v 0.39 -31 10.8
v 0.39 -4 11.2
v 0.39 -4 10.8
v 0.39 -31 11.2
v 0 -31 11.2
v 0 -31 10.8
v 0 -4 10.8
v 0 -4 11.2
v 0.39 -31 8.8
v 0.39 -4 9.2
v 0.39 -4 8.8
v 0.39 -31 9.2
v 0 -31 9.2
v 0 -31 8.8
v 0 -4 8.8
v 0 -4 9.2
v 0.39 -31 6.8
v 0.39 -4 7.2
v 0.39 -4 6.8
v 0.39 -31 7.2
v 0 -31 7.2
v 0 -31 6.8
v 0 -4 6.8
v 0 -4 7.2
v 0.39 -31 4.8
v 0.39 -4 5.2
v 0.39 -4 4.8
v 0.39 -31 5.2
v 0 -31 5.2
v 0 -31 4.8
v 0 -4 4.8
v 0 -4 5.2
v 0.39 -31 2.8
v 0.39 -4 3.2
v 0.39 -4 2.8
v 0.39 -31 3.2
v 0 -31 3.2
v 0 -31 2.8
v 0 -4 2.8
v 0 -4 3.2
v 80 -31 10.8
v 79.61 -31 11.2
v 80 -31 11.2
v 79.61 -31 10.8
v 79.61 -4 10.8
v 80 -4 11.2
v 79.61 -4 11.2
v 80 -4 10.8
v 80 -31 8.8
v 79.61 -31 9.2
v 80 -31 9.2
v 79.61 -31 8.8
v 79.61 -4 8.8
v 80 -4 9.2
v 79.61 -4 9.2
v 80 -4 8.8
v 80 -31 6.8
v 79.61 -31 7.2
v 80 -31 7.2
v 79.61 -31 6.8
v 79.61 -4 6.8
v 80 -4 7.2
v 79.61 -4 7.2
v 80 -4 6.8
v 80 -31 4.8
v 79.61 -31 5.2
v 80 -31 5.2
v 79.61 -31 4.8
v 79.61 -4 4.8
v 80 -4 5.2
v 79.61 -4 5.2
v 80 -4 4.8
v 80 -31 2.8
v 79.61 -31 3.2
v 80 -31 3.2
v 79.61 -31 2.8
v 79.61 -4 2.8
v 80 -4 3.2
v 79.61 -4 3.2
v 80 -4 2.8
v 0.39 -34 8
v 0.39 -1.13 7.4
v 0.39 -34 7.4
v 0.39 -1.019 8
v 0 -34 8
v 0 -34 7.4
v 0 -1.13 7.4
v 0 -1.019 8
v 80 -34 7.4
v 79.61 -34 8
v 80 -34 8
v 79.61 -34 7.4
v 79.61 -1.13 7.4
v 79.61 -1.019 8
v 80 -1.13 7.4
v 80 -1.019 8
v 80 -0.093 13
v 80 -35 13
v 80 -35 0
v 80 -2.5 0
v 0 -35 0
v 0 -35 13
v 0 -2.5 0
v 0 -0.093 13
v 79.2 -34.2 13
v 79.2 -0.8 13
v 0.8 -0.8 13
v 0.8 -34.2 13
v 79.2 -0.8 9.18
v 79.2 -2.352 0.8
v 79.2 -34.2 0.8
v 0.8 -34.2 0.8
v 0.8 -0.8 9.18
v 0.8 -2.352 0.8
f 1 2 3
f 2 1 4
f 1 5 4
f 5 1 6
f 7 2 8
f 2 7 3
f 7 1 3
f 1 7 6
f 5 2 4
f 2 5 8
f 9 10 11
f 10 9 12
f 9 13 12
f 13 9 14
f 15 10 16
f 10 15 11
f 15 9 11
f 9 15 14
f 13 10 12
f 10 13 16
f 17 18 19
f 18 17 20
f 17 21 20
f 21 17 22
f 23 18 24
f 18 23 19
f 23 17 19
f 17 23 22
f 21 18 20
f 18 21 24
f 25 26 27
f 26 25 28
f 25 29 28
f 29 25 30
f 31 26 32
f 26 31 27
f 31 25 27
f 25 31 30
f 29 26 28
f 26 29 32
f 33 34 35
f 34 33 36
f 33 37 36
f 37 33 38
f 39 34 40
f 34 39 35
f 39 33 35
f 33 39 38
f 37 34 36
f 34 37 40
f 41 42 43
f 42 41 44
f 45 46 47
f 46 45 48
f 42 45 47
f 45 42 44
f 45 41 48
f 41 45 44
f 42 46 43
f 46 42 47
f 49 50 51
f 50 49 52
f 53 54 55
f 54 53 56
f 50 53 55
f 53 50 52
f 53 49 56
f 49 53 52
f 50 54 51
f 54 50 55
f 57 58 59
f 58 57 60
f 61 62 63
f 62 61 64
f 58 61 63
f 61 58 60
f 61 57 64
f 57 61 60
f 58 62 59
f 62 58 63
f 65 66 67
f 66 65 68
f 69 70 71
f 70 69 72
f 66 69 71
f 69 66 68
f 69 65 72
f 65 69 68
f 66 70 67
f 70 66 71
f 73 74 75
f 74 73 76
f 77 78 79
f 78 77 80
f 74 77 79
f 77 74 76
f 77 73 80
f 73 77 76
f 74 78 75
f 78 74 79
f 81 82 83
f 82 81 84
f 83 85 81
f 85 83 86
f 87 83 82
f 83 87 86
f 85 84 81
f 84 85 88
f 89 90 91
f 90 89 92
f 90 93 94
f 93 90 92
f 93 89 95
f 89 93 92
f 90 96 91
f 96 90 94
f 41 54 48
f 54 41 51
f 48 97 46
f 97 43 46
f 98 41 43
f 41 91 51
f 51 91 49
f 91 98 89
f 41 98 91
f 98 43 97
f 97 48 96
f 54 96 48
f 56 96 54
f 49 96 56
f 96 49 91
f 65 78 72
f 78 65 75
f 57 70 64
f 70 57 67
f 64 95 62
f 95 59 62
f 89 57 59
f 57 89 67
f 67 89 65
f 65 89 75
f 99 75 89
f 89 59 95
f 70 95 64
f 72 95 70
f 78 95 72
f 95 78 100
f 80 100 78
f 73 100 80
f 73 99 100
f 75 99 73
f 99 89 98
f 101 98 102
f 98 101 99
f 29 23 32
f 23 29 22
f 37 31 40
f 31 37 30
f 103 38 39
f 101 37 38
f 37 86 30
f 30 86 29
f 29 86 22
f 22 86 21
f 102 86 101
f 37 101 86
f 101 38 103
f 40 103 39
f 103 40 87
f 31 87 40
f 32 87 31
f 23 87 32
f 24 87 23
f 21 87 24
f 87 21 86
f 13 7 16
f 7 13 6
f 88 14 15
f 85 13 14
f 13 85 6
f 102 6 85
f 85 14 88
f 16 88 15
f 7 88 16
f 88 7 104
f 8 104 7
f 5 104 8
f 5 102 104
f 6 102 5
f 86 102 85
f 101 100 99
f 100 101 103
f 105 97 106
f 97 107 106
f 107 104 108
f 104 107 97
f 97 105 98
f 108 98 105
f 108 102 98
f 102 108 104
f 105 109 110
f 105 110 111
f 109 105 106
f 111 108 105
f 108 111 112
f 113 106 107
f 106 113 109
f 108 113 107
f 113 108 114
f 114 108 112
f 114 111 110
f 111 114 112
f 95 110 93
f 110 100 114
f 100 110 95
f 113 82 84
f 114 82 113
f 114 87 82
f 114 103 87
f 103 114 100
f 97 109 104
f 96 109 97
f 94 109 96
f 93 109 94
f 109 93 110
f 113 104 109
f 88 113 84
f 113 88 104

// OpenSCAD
// Sony a6300 rear cooling fan: fit test (DRAFT)
// Author: Denis Shatilov
// License: CC BY-NC 4.0
// https://creativecommons.org/licenses/by-nc/4.0/
//
// A thin open-backed shell with the box's outside size, to try against the camera before printing
// the real box. Hold it in the pocket under the eyepiece, back against the magnesium plate, and
// tilt the screen: where the screen touches is how much the real box has to lose. Depth marks
// every 2 mm on the sides (the 5.3 mm mark is the recess edge) make it easy to read off.
// Printed front face down, no supports.

include <sony-a6300-fan.scad>

show_part = false;
t = 0.8;          // shell wall
mark = 0.4;       // mark groove depth

module fit_test() {
    difference() {
        cube([box_w, box_d, box_h]);
        translate([t, -1, t]) cube([box_w - 2 * t, box_d - t + 1, box_h - 2 * t]);
        // same bottom bevel as the box
        rotate([90, 0, 90]) translate([0, 0, -1]) linear_extrude(box_w + 2)
            polygon([[-1, -1], [box_d + 1, -1], [box_d + 1, slant(box_d + 1)], [-1, slant(-1)]]);
        // depth marks on both side walls: every 2 mm, long one at the 5.3 mm recess edge
        for (x = [-0.01, box_w - mark + 0.01], y = [2 : 2 : box_d - 2]) translate([x, y - 0.2, 4]) cube([mark, 0.4, box_h - 8]);
        for (x = [-0.01, box_w - mark + 0.01]) translate([x, 5.3 - 0.3, 1]) cube([mark, 0.6, box_h - 2]);
    }
}

// front face down
translate([0, 0, box_d]) rotate([90, 0, 0]) mirror([0, 1, 0]) fit_test();
